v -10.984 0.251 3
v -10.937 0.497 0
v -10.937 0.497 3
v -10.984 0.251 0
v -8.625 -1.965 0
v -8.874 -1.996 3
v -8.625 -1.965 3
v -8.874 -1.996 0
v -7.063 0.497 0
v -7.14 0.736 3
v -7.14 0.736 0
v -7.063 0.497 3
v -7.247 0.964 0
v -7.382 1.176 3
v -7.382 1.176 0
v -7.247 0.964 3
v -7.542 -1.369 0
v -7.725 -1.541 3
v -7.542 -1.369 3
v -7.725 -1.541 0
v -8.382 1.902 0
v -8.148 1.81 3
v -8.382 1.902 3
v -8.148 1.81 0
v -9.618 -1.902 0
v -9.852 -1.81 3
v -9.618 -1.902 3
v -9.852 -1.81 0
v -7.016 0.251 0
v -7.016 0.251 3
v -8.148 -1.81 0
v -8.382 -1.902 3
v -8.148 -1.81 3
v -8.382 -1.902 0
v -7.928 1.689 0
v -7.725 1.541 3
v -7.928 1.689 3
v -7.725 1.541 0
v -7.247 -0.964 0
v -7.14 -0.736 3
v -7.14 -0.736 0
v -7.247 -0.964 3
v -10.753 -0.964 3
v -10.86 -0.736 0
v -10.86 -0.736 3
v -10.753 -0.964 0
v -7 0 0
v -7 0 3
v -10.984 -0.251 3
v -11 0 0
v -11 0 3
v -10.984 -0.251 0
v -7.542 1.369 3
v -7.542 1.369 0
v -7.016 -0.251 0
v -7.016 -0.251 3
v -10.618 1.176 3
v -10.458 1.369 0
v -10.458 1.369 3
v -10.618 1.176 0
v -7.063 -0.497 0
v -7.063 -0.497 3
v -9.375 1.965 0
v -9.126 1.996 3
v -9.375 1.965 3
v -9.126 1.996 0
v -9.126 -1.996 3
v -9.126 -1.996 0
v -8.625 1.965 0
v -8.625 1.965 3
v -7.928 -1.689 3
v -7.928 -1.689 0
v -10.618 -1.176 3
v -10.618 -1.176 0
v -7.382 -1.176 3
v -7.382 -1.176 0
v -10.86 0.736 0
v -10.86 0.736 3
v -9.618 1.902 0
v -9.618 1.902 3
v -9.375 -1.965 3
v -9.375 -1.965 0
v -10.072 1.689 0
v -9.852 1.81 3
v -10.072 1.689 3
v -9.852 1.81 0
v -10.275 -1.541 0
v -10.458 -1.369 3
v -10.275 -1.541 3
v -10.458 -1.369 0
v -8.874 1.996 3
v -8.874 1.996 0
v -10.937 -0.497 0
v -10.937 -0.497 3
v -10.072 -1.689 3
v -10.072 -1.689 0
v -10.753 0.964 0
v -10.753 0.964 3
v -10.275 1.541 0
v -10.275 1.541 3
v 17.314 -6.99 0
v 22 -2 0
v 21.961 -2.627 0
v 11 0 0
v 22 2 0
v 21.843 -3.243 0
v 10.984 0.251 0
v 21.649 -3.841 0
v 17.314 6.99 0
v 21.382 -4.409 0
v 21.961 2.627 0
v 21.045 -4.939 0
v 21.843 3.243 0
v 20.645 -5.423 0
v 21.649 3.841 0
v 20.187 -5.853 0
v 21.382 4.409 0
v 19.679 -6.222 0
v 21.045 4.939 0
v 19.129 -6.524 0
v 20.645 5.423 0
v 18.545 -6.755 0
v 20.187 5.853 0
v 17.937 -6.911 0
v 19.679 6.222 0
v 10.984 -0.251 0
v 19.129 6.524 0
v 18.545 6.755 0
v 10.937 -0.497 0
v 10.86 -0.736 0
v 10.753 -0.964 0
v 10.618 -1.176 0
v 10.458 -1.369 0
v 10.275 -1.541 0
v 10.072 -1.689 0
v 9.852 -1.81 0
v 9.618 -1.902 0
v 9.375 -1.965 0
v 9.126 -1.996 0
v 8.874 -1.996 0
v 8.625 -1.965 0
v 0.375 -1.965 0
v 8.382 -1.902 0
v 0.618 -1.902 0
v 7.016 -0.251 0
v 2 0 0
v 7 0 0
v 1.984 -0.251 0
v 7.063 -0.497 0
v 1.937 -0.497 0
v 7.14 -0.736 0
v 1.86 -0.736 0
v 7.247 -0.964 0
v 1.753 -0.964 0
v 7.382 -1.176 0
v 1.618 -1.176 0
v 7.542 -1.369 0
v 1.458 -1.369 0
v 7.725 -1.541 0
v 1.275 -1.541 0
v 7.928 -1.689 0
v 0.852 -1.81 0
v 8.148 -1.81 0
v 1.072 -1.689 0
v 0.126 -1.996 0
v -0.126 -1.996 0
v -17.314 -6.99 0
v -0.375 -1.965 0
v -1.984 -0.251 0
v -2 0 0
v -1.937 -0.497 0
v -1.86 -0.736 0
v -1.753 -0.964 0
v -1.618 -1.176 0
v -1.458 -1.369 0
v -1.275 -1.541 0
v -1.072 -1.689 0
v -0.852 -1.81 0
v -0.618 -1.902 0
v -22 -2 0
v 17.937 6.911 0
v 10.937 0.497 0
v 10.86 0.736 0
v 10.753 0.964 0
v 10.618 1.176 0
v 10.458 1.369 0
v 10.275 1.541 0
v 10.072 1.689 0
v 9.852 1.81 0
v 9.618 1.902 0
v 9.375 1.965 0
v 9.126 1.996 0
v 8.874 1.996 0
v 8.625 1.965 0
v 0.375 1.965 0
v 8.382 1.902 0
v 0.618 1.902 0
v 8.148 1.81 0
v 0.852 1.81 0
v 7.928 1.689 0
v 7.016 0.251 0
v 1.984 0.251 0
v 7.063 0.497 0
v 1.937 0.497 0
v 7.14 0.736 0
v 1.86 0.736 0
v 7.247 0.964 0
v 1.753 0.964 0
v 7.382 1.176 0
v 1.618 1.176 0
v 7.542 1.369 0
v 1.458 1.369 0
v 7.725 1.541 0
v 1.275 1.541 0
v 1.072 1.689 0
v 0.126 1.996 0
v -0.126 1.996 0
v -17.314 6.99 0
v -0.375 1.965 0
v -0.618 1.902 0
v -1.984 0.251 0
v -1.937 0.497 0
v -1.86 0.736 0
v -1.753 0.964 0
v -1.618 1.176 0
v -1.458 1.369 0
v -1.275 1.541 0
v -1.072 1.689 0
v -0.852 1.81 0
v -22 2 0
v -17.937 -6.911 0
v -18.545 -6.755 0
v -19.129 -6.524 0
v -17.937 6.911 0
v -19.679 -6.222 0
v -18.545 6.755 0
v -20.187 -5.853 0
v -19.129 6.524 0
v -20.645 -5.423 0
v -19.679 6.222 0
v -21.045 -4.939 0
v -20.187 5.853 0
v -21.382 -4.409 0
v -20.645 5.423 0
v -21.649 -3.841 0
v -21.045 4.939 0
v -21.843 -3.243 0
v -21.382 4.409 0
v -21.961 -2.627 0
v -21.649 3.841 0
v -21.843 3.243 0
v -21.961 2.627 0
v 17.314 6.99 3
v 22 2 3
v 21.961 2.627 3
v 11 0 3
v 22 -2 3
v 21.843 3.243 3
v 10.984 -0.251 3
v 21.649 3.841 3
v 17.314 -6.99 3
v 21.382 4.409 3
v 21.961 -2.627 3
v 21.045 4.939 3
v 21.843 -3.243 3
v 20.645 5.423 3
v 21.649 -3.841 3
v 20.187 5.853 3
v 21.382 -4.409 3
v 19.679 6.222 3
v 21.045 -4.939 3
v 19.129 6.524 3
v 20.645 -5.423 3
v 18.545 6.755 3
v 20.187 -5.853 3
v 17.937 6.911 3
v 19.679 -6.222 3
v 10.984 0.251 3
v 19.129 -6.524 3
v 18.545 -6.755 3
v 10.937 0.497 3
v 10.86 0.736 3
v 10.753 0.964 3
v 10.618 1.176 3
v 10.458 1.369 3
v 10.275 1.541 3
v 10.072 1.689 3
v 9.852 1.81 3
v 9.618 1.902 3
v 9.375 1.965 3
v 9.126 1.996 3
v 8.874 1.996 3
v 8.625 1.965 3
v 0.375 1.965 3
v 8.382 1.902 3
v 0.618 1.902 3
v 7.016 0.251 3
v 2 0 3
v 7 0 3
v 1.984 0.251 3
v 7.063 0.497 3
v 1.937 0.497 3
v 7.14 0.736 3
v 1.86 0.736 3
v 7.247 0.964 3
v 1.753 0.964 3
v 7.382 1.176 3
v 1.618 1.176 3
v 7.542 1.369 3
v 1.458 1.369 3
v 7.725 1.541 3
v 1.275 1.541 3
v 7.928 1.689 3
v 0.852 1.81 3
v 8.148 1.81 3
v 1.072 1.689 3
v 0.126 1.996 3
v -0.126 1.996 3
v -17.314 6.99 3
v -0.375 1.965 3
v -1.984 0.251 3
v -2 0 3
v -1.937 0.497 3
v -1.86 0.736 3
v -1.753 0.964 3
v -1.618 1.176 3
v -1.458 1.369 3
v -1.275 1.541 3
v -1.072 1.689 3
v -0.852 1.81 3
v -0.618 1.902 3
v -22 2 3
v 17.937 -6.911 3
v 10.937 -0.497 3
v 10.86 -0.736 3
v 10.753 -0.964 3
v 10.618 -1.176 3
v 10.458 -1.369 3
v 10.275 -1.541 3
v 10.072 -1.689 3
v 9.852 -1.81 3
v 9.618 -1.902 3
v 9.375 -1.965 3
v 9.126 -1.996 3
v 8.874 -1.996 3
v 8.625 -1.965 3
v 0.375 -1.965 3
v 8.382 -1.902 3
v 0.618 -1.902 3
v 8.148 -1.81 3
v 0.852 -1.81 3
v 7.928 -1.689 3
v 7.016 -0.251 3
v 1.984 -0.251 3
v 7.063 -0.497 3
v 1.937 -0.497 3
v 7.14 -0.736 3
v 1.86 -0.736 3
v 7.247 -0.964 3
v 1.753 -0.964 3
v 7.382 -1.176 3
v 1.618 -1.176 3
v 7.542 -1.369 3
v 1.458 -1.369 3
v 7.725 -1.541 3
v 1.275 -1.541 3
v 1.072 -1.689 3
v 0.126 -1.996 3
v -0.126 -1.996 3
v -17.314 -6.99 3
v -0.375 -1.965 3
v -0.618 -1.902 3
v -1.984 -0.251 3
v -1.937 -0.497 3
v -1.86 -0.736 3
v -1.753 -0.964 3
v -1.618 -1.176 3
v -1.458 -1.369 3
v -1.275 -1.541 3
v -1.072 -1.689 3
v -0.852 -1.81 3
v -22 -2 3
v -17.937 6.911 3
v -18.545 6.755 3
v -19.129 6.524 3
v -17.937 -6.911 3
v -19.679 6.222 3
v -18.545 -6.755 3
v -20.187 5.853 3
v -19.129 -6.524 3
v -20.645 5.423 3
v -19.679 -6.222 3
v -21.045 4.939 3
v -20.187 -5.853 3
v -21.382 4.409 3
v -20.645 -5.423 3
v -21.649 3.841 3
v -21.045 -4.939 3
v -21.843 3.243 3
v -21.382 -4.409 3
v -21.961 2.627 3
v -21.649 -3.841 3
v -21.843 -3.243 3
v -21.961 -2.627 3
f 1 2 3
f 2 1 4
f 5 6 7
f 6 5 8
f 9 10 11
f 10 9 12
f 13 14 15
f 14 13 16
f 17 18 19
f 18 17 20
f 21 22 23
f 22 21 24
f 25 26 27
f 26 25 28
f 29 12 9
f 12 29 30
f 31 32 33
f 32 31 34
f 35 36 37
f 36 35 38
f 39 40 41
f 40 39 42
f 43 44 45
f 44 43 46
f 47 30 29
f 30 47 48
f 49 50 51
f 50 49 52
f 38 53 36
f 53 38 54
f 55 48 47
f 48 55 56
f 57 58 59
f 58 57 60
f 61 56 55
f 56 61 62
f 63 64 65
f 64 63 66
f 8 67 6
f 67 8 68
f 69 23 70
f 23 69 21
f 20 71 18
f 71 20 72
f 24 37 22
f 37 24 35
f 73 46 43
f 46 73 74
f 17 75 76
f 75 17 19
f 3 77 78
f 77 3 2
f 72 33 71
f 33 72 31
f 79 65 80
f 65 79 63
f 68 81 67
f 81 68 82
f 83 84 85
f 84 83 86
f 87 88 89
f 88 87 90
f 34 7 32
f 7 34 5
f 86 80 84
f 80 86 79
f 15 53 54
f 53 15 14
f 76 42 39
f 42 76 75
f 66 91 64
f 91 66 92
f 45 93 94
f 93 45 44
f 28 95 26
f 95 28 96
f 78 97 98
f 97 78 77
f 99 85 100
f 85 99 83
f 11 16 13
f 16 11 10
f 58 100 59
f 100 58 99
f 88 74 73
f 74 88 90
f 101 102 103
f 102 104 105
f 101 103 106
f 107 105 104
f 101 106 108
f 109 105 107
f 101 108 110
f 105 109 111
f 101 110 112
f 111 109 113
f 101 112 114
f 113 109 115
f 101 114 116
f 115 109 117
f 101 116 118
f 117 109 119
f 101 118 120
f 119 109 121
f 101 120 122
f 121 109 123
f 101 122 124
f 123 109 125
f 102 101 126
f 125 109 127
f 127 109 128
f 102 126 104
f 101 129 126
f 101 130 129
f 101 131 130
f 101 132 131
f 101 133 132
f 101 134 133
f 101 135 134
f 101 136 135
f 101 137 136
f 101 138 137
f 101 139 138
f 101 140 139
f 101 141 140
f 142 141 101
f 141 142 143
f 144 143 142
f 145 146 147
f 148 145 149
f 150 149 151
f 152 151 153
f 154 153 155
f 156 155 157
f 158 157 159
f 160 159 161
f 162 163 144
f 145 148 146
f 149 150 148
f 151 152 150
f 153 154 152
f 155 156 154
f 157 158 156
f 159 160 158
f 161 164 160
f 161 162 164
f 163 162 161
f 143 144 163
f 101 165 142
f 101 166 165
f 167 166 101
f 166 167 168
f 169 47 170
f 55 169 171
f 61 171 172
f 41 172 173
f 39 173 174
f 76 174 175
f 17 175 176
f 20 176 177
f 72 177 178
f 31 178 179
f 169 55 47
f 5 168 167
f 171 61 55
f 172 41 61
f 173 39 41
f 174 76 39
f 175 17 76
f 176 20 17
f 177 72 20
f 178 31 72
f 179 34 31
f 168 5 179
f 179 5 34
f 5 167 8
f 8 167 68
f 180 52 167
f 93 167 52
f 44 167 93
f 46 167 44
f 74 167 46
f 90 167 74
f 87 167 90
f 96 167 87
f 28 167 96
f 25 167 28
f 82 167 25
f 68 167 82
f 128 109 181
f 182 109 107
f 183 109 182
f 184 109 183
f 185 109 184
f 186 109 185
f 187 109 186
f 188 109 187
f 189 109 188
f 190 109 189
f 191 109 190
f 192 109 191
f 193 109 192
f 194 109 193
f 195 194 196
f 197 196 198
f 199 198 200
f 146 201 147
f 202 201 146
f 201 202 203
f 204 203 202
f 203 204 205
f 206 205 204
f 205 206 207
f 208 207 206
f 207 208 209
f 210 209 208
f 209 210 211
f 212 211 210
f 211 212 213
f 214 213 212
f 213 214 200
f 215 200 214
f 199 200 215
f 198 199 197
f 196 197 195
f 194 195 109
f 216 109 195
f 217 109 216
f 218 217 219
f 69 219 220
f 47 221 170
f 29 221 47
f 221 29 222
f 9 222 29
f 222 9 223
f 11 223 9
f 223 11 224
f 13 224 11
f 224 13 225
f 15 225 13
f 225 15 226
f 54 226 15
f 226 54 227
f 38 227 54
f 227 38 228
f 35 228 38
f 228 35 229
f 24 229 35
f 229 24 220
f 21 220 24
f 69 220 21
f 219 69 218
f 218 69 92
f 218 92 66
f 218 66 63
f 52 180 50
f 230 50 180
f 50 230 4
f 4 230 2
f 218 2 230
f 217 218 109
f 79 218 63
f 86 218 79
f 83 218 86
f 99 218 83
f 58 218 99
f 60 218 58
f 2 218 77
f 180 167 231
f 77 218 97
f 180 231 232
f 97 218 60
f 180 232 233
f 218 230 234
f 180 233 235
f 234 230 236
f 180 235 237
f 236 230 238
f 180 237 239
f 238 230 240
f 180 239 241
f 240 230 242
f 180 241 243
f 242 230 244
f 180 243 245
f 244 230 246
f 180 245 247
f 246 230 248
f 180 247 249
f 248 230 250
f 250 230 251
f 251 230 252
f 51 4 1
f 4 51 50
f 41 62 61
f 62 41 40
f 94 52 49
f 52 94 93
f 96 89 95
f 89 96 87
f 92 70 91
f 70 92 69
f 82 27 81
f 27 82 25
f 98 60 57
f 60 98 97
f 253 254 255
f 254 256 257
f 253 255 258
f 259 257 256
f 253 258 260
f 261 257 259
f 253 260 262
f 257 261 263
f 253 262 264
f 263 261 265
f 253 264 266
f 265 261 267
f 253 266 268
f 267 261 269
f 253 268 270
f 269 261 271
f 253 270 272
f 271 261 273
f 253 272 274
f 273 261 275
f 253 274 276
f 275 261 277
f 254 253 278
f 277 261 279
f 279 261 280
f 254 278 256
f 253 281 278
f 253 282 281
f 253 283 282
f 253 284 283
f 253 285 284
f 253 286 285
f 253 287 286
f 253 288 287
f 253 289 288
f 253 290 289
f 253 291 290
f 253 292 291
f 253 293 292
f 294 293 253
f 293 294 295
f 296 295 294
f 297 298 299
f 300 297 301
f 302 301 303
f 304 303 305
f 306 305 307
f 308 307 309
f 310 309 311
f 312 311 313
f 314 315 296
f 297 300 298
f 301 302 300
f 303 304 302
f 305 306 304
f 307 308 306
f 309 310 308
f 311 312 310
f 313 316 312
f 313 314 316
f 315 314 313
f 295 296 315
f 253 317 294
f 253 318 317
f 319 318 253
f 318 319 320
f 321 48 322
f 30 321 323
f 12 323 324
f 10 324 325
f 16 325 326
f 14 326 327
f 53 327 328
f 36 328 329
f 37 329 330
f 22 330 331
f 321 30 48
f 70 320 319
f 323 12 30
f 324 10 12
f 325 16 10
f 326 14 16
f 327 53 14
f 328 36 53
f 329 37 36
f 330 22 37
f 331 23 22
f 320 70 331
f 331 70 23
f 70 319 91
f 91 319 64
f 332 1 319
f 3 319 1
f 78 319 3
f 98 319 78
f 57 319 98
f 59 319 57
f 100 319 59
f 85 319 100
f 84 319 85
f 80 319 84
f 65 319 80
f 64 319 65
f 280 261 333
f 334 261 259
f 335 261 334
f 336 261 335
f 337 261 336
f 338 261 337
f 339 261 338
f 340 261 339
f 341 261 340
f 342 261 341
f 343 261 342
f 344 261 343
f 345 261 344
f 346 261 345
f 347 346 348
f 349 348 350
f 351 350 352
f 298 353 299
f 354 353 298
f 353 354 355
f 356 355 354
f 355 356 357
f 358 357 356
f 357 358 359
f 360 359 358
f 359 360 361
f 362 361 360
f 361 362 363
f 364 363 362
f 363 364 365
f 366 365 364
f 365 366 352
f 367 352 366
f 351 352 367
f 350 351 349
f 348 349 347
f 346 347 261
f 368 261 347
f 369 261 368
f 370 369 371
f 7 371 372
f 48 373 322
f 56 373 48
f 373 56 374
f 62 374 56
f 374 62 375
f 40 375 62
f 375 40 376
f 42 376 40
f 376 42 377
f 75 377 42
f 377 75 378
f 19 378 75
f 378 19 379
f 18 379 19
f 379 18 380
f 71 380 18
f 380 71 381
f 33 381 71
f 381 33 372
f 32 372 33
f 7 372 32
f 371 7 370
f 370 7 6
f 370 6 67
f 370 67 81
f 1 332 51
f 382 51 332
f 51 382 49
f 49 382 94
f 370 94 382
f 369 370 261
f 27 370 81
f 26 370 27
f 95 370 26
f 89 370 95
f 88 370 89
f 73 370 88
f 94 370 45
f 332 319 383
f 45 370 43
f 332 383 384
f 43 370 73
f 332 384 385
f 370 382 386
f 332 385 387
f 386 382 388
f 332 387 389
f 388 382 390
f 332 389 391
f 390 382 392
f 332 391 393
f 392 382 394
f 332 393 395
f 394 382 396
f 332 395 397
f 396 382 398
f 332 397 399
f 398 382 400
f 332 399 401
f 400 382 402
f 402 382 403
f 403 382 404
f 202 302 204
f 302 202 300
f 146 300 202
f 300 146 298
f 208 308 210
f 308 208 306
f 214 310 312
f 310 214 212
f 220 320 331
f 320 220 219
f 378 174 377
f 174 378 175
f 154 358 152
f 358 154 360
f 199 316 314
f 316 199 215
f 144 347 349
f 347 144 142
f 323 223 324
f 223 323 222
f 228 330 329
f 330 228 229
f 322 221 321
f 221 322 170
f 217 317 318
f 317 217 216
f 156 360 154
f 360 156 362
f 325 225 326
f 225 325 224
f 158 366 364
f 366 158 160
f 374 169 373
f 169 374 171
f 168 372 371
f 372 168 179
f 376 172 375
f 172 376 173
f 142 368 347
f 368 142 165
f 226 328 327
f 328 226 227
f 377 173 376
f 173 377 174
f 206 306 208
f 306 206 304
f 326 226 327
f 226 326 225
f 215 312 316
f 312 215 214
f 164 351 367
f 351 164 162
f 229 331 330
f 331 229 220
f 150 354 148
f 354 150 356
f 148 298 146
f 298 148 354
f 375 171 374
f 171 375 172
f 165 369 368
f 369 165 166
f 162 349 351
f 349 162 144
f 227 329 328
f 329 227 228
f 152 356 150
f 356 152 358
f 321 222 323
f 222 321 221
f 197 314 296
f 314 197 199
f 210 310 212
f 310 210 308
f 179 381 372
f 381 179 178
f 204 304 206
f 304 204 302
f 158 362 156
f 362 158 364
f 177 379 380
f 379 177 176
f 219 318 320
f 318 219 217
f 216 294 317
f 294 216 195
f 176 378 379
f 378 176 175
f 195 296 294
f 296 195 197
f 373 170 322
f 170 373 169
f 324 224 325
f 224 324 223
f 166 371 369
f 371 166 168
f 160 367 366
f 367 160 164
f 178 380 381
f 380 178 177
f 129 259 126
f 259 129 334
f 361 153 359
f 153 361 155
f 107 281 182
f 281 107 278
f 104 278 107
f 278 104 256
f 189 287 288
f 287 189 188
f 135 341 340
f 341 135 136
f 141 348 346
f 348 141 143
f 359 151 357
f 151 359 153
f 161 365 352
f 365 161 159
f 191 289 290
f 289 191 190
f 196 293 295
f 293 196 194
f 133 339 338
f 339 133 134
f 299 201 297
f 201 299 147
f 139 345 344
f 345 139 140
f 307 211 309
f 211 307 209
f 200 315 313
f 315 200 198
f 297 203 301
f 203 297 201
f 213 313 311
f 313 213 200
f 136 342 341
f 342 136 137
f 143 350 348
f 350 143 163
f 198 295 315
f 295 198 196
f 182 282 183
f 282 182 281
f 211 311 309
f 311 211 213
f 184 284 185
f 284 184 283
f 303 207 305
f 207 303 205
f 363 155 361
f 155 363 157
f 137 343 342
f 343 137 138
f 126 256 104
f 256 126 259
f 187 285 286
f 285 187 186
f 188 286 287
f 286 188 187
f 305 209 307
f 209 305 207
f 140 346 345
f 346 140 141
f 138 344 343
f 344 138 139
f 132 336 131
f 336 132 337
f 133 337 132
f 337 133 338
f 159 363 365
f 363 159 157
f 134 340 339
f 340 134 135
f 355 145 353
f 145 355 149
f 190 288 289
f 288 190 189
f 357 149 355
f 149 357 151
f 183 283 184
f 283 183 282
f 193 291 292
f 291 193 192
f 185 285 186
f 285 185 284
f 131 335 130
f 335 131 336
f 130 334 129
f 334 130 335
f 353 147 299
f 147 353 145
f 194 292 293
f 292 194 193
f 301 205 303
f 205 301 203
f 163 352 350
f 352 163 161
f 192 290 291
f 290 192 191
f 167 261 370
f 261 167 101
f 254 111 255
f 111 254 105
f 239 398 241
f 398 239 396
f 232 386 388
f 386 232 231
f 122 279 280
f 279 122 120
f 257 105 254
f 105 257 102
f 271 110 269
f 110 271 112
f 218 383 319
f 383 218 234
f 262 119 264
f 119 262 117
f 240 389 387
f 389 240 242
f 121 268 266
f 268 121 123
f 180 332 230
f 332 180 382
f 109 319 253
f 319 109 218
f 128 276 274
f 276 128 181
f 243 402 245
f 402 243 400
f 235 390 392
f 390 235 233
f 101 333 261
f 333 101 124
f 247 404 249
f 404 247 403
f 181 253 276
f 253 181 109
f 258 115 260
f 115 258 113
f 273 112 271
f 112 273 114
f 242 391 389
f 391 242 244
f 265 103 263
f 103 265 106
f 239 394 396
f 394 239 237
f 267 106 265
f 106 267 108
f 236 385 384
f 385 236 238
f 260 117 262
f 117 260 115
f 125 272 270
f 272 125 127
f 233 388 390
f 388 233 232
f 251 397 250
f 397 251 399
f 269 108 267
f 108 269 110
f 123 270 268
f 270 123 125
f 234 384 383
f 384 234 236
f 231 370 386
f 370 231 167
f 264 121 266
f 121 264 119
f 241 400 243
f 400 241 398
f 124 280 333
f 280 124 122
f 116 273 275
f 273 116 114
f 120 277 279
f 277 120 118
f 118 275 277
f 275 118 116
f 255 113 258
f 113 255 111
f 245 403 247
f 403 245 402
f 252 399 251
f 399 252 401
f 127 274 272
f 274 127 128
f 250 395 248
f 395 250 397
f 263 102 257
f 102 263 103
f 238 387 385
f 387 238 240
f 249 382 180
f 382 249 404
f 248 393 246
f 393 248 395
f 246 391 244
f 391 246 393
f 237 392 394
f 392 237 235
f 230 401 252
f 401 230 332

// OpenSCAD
$fn = 50;

difference() {
	union() {
		hull() {
			translate(v = [-17.0, 2.0, 0]) {
				cylinder(h = 3, r = 5);
			}
			translate(v = [17.0, 2.0, 0]) {
				cylinder(h = 3, r = 5);
			}
			translate(v = [-17.0, -2.0, 0]) {
				cylinder(h = 3, r = 5);
			}
			translate(v = [17.0, -2.0, 0]) {
				cylinder(h = 3, r = 5);
			}
		}
	}
	union() {
		translate(v = [-9.0, 0, 0.0]) {
			cylinder(h = 3, r = 2.0);
		}
		cylinder(h = 3, r = 2.0);
		translate(v = [9.0, 0, 0.0]) {
			cylinder(h = 3, r = 2.0);
		}
	}
}
